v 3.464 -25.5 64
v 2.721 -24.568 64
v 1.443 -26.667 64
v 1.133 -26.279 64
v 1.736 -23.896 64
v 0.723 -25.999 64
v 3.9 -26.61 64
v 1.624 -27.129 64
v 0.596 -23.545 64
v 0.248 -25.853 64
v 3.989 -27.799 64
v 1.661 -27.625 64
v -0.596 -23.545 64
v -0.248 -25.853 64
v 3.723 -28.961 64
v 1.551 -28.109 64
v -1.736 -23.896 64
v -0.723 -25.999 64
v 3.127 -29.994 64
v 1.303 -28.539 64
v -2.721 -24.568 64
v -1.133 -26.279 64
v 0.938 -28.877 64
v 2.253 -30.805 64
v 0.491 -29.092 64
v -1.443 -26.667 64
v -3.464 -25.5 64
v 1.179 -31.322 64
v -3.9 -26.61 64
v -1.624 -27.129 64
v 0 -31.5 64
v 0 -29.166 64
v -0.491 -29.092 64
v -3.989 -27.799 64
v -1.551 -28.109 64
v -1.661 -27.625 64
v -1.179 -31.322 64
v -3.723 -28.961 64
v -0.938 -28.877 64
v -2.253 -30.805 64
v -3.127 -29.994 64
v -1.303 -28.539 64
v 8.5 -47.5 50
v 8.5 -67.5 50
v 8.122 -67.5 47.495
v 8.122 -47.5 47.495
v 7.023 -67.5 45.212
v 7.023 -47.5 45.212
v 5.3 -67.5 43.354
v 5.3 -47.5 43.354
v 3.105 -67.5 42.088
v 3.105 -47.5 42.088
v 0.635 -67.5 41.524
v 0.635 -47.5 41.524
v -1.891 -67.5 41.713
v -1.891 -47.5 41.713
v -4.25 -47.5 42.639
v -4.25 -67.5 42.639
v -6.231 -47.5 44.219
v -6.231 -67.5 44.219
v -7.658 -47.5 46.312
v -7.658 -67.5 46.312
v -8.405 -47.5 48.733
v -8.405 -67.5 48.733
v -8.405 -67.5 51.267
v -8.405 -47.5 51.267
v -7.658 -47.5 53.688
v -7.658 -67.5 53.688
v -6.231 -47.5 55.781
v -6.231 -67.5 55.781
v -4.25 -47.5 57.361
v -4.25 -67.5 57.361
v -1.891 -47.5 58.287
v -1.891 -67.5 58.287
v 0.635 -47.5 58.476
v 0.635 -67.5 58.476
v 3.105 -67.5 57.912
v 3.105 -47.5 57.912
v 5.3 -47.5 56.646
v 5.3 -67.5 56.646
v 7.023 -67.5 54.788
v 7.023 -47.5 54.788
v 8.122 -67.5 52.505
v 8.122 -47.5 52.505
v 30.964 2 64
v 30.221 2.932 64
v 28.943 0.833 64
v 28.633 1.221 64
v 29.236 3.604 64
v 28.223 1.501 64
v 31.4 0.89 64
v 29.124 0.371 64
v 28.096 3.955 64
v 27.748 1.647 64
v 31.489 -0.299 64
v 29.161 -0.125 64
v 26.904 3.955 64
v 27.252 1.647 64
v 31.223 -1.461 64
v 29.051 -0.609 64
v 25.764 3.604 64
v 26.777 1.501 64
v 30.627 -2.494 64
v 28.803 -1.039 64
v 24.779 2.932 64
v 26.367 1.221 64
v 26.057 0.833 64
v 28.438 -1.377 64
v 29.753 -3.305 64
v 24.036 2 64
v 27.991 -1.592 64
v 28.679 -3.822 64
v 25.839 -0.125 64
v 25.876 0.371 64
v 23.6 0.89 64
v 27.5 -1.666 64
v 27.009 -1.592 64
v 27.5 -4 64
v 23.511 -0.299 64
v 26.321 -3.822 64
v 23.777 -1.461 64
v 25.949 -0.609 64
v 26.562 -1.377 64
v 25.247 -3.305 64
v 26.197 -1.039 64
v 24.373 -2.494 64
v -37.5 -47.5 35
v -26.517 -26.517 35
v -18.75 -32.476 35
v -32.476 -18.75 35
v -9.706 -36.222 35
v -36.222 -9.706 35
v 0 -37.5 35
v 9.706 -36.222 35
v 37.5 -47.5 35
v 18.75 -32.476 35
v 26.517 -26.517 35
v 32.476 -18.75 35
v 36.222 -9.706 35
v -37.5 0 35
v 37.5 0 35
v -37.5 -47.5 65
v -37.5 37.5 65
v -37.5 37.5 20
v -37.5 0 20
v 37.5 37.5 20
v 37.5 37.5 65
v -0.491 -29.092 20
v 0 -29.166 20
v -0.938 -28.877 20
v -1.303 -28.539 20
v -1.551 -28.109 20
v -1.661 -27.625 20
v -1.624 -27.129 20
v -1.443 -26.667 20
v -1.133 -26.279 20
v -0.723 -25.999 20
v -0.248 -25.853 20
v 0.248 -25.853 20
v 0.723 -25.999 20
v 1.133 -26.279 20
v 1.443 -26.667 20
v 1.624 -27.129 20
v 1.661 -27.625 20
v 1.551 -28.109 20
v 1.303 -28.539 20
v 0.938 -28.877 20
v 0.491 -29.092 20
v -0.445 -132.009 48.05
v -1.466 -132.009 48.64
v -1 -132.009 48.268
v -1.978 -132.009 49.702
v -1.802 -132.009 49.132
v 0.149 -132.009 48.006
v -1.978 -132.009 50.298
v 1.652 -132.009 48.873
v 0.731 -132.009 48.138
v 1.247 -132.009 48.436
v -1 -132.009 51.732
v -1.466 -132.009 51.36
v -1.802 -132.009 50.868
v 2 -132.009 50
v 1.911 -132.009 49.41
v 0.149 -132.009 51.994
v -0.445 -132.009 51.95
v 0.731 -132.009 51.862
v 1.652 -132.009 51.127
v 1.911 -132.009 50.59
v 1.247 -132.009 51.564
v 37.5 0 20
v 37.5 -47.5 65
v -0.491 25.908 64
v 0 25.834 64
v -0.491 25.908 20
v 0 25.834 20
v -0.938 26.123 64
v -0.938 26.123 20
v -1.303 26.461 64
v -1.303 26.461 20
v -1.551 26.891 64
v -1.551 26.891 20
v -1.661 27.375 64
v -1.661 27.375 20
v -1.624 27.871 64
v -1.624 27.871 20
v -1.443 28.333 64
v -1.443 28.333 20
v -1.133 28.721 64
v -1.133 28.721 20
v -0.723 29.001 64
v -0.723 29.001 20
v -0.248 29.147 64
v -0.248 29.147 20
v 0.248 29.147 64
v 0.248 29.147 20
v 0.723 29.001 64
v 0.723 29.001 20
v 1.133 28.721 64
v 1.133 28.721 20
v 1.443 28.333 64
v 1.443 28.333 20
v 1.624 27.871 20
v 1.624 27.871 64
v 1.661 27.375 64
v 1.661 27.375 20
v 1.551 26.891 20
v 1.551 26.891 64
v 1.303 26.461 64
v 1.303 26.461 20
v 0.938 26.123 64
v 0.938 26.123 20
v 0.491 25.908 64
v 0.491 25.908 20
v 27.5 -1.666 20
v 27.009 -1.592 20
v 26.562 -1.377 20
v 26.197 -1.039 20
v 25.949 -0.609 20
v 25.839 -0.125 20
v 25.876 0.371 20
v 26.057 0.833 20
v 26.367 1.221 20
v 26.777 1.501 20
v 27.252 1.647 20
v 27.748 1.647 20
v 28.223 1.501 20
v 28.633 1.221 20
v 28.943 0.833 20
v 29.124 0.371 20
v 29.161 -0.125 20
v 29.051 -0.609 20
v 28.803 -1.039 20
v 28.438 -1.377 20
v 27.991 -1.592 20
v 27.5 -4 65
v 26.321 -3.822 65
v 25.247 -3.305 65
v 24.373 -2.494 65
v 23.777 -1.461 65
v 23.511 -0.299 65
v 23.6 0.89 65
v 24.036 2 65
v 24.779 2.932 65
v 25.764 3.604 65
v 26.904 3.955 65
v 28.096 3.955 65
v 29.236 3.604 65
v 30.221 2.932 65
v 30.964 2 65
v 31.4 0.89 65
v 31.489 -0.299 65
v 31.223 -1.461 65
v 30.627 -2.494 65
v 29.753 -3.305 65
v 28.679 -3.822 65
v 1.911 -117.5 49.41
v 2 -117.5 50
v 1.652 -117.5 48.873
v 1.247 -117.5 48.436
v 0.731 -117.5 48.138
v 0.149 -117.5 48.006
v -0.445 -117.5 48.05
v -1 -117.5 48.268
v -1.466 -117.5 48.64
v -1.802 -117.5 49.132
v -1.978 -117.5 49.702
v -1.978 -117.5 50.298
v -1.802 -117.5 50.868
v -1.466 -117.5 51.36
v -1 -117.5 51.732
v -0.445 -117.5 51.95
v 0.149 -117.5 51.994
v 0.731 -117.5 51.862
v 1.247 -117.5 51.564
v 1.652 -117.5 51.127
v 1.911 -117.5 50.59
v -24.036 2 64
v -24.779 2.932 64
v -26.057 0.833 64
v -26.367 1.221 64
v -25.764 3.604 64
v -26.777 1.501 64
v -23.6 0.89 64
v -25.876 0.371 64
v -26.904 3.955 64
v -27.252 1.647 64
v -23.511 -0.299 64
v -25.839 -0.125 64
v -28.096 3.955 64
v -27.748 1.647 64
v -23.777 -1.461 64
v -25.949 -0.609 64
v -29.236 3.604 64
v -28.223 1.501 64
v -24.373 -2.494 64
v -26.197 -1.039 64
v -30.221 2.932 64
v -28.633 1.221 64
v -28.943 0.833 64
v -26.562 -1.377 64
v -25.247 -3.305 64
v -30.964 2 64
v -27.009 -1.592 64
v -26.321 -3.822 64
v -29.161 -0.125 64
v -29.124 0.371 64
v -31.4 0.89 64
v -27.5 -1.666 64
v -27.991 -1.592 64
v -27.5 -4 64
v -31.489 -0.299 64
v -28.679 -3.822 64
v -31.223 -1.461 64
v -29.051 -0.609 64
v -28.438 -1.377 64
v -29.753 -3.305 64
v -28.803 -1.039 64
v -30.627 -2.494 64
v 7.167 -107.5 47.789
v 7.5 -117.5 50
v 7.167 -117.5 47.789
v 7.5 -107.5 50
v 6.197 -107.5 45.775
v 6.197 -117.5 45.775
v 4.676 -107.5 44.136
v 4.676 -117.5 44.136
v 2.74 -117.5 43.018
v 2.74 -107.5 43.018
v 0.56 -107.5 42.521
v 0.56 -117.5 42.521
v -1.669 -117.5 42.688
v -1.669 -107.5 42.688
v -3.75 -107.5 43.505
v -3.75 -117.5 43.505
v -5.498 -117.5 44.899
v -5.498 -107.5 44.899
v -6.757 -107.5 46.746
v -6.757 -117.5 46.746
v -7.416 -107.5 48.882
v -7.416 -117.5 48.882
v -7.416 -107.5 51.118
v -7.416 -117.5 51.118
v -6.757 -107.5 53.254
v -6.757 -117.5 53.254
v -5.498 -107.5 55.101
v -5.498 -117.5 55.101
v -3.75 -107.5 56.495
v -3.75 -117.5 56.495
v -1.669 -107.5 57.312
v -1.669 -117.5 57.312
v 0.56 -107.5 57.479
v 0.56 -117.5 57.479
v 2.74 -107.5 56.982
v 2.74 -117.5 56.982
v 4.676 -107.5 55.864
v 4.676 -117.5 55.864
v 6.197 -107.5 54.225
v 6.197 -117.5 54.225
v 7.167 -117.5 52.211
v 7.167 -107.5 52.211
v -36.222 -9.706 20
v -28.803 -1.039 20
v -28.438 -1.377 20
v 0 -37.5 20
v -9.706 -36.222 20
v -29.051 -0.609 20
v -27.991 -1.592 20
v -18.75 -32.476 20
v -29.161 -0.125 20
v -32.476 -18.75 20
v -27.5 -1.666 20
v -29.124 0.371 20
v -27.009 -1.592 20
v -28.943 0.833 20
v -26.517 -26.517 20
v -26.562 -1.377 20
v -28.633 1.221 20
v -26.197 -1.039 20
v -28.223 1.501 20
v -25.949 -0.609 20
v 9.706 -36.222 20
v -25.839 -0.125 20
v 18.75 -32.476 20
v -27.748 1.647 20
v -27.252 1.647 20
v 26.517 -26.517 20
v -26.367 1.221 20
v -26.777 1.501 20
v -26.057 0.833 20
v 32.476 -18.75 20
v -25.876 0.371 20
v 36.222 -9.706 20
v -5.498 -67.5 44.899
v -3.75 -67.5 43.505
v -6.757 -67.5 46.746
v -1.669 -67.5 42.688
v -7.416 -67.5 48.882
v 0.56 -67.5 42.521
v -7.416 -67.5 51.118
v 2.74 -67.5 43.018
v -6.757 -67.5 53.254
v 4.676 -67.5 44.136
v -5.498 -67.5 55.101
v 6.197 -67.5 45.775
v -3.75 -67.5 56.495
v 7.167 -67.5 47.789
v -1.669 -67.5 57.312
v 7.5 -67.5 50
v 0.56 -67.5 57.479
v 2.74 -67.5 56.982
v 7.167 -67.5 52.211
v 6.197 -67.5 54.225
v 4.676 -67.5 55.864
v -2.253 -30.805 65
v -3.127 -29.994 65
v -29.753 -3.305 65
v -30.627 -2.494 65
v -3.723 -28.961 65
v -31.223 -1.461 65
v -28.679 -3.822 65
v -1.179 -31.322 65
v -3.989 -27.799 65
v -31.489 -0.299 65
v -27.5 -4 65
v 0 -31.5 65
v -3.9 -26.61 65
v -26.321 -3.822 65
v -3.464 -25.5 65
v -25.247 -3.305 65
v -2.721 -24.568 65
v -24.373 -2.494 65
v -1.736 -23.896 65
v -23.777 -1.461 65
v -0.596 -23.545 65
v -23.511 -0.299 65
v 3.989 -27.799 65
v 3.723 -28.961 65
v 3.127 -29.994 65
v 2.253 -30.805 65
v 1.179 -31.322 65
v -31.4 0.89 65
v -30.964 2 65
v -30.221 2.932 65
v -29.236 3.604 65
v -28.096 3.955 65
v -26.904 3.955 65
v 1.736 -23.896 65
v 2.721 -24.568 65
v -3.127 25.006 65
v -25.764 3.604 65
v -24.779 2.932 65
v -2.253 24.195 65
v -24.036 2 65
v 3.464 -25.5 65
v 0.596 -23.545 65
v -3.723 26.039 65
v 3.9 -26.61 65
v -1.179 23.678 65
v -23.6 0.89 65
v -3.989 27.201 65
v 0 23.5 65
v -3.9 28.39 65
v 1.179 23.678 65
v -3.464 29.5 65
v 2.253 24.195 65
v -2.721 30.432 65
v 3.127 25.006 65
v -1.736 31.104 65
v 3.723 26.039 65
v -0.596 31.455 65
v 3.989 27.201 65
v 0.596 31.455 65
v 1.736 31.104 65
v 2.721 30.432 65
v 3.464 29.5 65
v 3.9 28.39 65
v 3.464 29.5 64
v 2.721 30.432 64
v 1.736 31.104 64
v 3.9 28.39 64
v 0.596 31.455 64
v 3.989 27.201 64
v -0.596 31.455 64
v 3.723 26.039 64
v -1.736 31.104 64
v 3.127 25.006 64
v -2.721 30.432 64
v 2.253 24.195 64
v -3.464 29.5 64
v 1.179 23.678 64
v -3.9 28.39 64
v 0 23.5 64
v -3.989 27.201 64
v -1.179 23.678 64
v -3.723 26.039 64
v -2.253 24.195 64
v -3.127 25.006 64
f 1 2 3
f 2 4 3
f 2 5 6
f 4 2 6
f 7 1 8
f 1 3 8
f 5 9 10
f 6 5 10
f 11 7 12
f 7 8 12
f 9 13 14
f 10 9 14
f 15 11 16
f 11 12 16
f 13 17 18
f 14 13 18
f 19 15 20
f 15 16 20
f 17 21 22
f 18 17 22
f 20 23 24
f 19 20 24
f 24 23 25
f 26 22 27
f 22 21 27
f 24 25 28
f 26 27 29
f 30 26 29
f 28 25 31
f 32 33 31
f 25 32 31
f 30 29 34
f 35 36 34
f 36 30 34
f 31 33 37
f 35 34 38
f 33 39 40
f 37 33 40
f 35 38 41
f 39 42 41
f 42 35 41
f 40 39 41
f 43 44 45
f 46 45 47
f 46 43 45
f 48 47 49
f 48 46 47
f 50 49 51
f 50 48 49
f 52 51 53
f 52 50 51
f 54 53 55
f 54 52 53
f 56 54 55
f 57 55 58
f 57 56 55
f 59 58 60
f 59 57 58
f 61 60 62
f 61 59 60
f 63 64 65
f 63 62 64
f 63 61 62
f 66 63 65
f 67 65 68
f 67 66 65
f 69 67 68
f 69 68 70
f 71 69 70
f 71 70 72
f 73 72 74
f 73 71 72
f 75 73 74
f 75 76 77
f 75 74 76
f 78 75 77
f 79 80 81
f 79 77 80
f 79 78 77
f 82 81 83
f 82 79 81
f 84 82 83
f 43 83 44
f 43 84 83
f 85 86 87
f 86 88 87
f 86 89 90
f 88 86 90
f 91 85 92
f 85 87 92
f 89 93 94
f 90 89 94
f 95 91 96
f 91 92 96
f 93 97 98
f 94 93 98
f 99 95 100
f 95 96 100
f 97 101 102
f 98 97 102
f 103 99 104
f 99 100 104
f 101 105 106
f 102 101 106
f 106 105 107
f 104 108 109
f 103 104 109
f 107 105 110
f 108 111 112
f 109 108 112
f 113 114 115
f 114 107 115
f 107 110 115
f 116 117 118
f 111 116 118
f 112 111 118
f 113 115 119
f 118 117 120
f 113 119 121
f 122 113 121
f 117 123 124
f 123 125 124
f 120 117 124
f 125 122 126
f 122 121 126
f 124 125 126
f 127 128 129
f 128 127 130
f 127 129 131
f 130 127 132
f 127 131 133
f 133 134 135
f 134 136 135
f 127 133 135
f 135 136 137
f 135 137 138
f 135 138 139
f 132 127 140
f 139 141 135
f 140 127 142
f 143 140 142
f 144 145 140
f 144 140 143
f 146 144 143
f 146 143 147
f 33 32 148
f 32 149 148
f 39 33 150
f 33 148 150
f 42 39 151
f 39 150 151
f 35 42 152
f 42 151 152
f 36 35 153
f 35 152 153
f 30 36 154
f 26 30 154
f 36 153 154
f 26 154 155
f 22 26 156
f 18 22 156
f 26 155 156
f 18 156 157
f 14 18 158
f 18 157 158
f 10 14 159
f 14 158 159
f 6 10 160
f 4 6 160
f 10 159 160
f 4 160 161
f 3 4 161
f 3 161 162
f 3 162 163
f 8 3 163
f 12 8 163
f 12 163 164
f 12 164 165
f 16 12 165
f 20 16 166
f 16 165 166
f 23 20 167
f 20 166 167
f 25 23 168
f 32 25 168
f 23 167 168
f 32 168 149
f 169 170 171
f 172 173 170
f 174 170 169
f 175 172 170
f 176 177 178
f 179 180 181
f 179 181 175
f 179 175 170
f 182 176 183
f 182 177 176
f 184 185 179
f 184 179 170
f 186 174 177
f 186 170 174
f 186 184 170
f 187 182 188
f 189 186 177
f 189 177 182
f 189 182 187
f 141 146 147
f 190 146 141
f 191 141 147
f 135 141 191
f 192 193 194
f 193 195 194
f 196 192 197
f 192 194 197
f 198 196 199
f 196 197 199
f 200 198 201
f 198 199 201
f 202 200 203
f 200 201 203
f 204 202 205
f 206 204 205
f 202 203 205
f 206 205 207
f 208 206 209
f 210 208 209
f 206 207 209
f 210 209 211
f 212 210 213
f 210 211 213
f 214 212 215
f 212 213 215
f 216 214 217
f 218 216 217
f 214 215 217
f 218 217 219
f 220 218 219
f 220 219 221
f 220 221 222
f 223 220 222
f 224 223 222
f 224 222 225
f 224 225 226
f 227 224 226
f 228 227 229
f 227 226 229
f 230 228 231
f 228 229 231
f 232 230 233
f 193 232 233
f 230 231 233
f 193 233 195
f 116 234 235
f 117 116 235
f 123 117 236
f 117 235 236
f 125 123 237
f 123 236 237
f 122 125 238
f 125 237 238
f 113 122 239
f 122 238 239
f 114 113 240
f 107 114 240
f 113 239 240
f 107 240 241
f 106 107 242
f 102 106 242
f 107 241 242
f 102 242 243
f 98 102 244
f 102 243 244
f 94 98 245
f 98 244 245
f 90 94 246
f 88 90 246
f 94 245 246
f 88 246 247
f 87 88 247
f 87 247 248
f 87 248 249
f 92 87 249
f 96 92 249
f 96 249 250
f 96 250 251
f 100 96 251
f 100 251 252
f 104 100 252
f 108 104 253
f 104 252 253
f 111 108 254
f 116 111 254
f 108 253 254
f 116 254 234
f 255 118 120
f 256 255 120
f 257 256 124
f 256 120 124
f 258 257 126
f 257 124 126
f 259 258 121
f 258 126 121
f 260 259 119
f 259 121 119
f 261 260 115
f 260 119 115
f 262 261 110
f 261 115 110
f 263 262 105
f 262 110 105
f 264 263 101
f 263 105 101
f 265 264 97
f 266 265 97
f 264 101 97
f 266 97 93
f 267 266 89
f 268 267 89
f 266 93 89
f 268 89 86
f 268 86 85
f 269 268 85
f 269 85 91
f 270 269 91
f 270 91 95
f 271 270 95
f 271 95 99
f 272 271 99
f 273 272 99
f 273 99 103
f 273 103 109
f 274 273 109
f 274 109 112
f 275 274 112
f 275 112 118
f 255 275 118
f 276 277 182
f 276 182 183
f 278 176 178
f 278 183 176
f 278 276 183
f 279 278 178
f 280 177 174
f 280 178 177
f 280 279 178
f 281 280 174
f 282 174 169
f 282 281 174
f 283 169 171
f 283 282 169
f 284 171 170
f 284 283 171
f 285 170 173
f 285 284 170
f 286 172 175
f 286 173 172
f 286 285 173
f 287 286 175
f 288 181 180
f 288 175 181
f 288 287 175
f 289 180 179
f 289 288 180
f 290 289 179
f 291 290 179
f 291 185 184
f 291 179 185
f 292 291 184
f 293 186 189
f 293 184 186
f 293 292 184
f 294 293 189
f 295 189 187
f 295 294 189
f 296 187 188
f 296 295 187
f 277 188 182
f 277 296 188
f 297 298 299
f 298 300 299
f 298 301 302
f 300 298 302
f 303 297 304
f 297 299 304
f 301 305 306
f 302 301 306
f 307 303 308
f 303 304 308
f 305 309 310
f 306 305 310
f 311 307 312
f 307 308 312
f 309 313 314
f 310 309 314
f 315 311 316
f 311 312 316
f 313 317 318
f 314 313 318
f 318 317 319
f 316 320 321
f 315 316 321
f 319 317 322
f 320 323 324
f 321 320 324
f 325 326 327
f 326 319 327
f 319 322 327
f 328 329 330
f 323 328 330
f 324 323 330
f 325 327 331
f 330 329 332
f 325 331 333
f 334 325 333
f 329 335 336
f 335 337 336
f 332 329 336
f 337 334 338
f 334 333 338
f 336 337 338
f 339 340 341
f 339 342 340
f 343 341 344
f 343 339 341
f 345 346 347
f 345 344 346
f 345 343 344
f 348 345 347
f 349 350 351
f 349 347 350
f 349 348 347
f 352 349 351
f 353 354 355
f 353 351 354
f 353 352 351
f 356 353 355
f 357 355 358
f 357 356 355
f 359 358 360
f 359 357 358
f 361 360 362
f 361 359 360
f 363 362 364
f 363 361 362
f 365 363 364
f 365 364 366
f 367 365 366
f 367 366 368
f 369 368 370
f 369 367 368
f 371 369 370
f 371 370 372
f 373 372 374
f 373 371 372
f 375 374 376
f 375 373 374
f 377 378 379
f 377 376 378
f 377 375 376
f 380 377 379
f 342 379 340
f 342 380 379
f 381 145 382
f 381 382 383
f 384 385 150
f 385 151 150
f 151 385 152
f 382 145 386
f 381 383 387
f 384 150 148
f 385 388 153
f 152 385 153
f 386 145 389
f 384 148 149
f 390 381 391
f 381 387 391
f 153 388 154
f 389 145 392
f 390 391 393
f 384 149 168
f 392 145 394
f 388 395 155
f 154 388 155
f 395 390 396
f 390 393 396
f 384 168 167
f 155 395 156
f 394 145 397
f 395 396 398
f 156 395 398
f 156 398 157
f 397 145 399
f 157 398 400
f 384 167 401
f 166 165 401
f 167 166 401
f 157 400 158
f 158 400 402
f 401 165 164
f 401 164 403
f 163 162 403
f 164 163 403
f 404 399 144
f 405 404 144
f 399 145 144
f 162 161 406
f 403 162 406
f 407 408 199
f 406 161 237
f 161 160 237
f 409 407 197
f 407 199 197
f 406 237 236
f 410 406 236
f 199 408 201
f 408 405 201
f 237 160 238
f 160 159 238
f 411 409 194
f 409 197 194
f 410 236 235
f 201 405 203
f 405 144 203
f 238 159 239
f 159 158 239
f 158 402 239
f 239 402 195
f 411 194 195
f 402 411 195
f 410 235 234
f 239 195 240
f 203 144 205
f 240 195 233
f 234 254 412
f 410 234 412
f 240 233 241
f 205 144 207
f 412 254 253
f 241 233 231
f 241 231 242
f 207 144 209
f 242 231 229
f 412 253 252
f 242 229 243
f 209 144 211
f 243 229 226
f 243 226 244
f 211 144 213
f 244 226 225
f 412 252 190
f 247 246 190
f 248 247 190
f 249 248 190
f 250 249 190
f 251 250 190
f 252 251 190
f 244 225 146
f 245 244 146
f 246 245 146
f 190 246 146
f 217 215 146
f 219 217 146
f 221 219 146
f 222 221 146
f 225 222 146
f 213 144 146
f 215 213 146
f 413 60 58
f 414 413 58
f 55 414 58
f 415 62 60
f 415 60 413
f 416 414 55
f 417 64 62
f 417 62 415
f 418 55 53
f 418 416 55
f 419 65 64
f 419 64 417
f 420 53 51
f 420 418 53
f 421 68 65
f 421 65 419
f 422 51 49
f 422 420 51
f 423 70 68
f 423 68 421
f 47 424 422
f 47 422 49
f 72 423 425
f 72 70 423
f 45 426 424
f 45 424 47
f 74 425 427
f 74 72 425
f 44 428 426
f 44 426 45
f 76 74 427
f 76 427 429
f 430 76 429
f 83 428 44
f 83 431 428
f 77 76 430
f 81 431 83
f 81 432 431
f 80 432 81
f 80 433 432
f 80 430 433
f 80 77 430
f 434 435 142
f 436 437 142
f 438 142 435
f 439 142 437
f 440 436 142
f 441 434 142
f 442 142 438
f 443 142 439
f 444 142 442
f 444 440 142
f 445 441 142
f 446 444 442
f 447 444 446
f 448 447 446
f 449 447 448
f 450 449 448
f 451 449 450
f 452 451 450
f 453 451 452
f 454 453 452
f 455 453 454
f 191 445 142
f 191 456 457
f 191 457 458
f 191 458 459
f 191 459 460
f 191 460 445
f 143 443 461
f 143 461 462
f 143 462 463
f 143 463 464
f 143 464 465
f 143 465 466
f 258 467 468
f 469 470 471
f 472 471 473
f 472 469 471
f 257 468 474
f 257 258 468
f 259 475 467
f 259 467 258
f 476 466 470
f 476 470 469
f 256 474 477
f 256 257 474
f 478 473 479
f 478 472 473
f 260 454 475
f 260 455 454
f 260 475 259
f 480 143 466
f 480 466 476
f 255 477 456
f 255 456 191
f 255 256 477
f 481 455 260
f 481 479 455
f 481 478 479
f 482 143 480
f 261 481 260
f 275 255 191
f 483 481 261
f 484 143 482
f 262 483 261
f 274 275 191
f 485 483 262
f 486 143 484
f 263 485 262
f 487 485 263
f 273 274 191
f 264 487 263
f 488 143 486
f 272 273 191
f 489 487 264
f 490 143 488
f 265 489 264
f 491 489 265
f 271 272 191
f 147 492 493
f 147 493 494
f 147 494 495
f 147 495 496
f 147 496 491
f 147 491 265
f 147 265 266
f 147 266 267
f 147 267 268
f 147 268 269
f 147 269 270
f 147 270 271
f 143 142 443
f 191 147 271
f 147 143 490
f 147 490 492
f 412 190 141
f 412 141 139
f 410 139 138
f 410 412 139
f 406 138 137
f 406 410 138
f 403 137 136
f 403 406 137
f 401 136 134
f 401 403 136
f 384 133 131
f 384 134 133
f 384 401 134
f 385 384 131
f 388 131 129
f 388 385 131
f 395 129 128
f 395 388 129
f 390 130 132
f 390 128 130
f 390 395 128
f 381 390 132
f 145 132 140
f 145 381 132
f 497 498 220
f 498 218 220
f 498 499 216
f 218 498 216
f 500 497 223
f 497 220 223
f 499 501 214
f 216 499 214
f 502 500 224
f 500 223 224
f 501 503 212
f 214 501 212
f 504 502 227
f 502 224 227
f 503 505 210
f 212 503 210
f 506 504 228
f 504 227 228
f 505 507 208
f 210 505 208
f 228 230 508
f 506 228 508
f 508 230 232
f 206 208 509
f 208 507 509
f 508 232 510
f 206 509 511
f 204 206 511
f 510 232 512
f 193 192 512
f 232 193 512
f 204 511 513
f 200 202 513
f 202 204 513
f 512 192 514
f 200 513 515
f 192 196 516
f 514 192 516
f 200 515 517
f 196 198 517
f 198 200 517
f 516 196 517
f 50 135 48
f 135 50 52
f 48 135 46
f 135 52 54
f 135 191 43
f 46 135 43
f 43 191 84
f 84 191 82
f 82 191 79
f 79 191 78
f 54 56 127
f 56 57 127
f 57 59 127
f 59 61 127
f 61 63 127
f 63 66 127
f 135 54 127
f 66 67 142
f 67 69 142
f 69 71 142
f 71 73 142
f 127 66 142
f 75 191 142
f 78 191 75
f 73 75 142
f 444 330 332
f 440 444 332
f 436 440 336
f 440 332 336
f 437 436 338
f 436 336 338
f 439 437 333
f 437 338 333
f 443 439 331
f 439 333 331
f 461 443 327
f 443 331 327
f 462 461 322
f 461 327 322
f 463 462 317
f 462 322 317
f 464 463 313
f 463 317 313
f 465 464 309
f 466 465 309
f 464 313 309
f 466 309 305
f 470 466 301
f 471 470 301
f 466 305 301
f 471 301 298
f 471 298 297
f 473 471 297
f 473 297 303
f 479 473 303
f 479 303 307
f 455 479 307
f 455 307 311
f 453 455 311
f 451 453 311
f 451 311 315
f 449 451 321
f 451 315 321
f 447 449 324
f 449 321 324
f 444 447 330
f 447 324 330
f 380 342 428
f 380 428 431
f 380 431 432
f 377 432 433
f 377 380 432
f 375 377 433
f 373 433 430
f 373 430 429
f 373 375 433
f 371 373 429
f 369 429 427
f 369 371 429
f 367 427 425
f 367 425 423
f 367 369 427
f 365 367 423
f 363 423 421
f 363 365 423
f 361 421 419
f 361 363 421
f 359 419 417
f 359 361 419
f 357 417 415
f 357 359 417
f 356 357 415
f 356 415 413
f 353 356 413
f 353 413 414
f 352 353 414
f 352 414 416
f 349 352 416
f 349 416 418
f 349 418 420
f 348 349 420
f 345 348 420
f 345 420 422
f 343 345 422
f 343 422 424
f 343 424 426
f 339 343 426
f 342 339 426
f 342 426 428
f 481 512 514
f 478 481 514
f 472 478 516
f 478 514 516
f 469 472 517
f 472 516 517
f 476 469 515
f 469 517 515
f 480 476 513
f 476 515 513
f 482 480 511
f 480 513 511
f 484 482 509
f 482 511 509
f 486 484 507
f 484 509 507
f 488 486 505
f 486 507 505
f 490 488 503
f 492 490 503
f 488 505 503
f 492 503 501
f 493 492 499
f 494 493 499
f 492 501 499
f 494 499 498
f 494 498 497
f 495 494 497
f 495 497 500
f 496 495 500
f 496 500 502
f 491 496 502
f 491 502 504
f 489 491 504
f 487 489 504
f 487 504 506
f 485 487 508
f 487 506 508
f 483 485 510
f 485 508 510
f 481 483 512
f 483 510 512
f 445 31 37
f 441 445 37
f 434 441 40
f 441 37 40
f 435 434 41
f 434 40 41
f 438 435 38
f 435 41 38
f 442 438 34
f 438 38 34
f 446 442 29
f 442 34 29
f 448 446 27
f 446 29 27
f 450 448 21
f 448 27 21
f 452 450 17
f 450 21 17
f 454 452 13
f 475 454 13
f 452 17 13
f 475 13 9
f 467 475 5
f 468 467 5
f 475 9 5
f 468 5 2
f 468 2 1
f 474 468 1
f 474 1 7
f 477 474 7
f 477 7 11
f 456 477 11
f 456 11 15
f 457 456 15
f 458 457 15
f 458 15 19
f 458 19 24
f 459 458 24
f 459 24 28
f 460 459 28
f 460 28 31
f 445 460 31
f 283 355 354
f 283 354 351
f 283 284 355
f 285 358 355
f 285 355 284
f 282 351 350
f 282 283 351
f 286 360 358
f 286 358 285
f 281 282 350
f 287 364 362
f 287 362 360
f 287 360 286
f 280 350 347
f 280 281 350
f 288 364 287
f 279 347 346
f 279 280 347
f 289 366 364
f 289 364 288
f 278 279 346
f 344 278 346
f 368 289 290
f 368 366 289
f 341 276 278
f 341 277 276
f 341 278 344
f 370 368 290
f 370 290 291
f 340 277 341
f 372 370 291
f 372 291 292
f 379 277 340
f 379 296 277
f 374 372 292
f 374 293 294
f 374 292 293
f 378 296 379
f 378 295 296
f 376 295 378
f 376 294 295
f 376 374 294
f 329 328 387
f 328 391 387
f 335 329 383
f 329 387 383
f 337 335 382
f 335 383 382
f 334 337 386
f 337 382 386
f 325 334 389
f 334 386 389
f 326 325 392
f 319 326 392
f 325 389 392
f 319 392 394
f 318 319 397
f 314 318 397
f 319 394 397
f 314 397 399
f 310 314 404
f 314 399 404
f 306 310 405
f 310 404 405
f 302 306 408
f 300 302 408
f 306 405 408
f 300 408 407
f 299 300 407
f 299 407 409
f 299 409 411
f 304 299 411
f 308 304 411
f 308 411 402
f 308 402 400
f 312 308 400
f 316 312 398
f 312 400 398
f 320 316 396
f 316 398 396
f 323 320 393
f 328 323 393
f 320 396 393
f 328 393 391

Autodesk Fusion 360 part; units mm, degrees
sketch "Sketch1" plane through (0, 0, 0) normal (0, 0, 1) x (1, 0, 0)
  line L0 (-37.5, 0) -> (-37.5, 37.5)
  line L1 (-37.5, 37.5) -> (37.5, 37.5)
  line L2 (37.5, 37.5) -> (37.5, 0)
  arc A0 (-37.5, 0) -> (37.5, 0) centre (0, 0) ccw
  dimension "d1" = 75
  dimension "d2" = 75
extrude "Extrude1" add sketch "Sketch1" along normal blind 35
sketch "Sketch2" plane through (0, 37.5, 0) normal (0, 1, 0) x (-1, 0, 0)
  line L0 (-37.5, 0) -> (37.5, 0)
  line L1 (37.5, 0) -> (37.5, 35)
  line L2 (37.5, 35) -> (-37.5, 35)
  line L3 (-37.5, 35) -> (-37.5, 0)
  line L4 (37.5, 65) -> (-37.5, 65)
  line L5 (-37.5, 65) -> (-37.5, 25)
  line L6 (-37.5, 25) -> (37.5, 25)
  line L7 (37.5, 25) -> (37.5, 65)
  line L8 (37.5, 65) -> (-37.5, 25) construction
  line L9 (-37.5, 65) -> (37.5, 25) construction
  point P0 (0, 45)
  dimension "d6" = 75
  dimension "d7" = 40
extrude "Extrude2" add sketch "Sketch2" against normal blind 85 contours L2 L4 L5 L7
sketch "Sketch3" plane through (0, 0, 0) normal (0, 1, 0) x (1, 0, 0)
  circle A0 centre (0, -50) radius 8.5
  point P0 (0, -50)
  dimension "d12" = 17
extrude "Extrude3" add sketch "Sketch3" against normal blind 107.5
sketch "Sketch4" plane through (0, -107.5, 0) normal (0, -1, 0) x (1, 0, 0)
  circle A0 centre (0, 50) radius 8.5
  circle A1 centre (0, 50) radius 7.5
  dimension "d15" = 15
extrude "Extrude4" cut sketch "Sketch4" against normal blind 40
sketch "Sketch5" plane through (0, 0, 0) normal (0, 0, -1) x (-1, 0, 0)
  line L0 (37.5, 0) -> (37.5, 37.5)
  line L1 (37.5, 37.5) -> (-37.5, 37.5)
  line L2 (-37.5, 37.5) -> (-37.5, 0)
  arc A0 (-37.5, 0) -> (37.5, 0) centre (0, 0) ccw
  line L3 (0, 37.5) -> (0, 27.5)
  line L4 (-37.5, 0) -> (-27.5, 0)
  line L5 (37.5, 0) -> (27.5, 0)
  line L6 (0, -37.5) -> (0, -27.5)
  dimension "d18" = 10
  dimension "d19" = 10
  dimension "d20" = 10
  dimension "d21" = 10
extrude "Extrude6" cut 1 faces at (-12.5, 25, 0) along direction (0, 0, 1) blind 20
sketch "Sketch6" plane through (0, -107.5, 0) normal (0, -1, 0) x (1, 0, 0)
  circle A0 centre (0, 50) radius 7.5
  circle A1 centre (0, 50) radius 7.5
extrude "Extrude7" add sketch "Sketch6" along normal blind 10
sketch "Sketch7" plane through (0, -117.5, 0) normal (0, -1, 0) x (1, 0, 0)
  circle A0 centre (0, 50) radius 7.5
  circle A1 centre (0, 50) radius 2
  dimension "d33" = 4
extrude "Extrude8" add sketch "Sketch7" along normal blind 14.509 contours A1
sketch "Sketch8" plane through (0, 0, 65) normal (0, 0, 1) x (1, 0, 0)
  line L0 (37.5, 37.5) -> (-37.5, 37.5)
  line L1 (-37.5, 37.5) -> (-37.5, -47.5)
  line L2 (-37.5, -47.5) -> (37.5, -47.5)
  line L3 (37.5, -47.5) -> (37.5, 37.5)
  line L4 (0, 37.5) -> (0, 27.5)
  line L5 (-37.5, 0) -> (-27.5, 0)
  line L6 (0, -37.5) -> (0, -27.5)
  line L7 (37.5, 0) -> (27.5, 0)
  dimension "d36" = 10
  dimension "d38" = 360
hole "Hole2" at (0, 27.5, 65) at (27.5, 0, 65) at (-27.5, 0, 65) at (0, -27.5, 65) direction (0, 0, -1) diameter 3.332 end through all counterbore diameter 8 counterbore depth 1
